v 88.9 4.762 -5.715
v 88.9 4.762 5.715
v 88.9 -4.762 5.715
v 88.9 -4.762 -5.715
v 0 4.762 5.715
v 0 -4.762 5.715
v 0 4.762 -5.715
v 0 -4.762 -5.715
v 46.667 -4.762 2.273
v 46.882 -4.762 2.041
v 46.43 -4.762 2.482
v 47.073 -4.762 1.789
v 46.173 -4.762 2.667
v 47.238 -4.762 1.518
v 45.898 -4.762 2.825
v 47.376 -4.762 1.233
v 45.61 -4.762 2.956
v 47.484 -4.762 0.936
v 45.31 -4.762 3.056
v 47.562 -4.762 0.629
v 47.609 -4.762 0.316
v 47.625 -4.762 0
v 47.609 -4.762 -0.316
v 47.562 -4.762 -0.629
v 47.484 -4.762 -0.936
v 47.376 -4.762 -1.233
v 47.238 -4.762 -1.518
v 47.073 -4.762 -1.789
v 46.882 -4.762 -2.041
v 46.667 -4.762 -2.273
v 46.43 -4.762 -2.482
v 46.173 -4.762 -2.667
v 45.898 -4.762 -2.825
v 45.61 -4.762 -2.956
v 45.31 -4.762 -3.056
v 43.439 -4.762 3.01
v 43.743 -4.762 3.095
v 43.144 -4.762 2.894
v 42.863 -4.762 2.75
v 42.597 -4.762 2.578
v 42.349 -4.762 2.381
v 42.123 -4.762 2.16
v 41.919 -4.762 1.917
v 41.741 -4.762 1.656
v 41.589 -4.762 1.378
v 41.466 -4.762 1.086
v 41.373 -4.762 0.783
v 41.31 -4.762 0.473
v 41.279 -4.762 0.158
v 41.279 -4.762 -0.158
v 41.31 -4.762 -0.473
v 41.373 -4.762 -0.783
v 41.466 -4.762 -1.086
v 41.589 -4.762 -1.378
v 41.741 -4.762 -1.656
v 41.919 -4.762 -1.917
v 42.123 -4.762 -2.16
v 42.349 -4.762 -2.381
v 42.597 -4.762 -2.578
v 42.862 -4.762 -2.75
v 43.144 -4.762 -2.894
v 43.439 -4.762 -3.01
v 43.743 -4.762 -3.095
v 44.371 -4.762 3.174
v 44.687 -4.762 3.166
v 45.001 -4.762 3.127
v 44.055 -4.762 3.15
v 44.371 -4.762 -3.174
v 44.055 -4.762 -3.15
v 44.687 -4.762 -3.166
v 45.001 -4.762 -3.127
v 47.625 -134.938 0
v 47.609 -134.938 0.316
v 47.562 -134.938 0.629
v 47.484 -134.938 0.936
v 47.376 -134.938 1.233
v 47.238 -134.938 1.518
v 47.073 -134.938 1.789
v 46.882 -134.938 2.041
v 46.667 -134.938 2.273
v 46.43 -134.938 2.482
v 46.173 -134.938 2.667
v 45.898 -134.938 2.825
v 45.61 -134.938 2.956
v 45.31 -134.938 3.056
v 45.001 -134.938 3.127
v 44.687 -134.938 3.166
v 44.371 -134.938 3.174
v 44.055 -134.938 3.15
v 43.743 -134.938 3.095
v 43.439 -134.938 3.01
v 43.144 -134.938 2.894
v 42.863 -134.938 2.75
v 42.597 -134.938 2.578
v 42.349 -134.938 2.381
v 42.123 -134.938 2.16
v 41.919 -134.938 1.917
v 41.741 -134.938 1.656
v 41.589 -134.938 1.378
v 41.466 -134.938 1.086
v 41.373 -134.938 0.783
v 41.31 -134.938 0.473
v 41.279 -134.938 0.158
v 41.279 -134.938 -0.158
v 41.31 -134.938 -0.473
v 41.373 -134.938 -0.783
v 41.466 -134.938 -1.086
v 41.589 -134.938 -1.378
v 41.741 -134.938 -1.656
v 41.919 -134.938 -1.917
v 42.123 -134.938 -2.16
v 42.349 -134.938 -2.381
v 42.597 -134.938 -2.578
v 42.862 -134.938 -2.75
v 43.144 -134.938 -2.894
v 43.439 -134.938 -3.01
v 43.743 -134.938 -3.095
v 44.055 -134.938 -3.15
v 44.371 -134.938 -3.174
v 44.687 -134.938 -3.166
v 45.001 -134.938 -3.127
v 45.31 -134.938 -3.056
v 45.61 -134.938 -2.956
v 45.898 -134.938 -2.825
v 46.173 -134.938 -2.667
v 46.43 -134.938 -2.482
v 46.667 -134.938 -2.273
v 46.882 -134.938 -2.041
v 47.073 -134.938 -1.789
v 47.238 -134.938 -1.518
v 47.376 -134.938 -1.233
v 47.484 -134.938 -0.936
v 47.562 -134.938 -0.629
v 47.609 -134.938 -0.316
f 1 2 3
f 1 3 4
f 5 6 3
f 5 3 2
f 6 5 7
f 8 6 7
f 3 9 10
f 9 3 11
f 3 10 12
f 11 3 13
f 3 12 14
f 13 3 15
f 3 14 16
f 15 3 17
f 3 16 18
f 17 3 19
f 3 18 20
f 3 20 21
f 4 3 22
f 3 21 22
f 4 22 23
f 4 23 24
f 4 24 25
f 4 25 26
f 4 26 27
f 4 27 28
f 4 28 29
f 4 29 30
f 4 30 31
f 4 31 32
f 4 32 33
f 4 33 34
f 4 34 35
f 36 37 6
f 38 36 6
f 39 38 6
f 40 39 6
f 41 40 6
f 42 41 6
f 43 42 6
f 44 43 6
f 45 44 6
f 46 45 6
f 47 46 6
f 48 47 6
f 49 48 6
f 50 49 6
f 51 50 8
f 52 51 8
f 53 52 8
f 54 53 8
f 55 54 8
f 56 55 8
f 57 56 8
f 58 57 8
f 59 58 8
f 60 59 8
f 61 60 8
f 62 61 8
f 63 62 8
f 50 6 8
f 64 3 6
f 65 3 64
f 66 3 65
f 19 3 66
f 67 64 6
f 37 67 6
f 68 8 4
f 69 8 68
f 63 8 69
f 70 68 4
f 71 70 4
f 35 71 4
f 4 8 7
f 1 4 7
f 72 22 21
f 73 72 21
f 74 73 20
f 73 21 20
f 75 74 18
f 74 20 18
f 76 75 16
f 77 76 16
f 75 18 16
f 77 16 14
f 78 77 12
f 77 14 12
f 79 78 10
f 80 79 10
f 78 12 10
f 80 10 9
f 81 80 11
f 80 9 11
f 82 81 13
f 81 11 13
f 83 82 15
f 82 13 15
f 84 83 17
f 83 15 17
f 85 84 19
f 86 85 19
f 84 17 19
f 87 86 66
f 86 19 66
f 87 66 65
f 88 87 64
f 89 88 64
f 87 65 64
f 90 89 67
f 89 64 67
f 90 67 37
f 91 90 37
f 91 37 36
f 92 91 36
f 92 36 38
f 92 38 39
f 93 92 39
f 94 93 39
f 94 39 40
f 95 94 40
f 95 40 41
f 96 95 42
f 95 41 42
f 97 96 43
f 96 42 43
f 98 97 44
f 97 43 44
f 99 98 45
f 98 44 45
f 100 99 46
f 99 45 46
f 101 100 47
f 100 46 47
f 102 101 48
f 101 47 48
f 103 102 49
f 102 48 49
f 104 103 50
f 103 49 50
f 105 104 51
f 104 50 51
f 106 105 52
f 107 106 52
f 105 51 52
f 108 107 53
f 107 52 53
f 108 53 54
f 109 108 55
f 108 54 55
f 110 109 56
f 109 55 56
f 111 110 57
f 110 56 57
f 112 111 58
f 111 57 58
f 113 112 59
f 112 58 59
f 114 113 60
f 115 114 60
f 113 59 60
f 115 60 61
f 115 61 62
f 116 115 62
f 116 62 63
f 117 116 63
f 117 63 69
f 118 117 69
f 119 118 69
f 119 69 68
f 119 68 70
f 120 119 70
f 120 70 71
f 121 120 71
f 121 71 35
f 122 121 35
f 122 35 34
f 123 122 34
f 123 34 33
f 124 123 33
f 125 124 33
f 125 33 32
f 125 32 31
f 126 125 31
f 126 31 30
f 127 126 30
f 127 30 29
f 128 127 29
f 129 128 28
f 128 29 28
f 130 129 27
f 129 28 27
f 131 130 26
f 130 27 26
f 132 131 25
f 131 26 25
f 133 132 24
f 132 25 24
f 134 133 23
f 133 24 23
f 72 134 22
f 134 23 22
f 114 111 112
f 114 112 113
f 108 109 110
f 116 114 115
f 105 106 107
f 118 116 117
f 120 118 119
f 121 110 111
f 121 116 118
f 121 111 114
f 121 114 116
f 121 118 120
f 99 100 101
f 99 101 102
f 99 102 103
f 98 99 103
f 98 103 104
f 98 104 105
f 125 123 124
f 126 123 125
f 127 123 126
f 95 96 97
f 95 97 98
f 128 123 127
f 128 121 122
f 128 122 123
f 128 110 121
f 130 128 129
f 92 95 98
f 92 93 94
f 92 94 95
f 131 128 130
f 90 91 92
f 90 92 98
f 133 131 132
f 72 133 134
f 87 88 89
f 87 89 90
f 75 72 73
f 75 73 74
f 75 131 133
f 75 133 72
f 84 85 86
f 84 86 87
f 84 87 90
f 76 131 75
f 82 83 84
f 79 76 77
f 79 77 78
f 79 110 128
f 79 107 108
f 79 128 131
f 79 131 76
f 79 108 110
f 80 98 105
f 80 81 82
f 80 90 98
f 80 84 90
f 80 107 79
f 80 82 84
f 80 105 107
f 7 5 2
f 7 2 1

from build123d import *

# Parameters (mm, degrees)
SKETCH1_W           = 11.43
SKETCH1_H           = 9.525
BOSS_EXTRUDE1_DEPTH = 88.9
SKETCH2_R           = 3.175
BOSS_EXTRUDE2_DEPTH = 130.175


with BuildPart() as part:
    # Sketch1 → Boss-Extrude1 (new body)
    with BuildSketch(Plane(origin=(0, 0, 0), x_dir=(0, 0, -1), z_dir=(1, 0, 0))):
        Rectangle(SKETCH1_W, SKETCH1_H)
    extrude(amount=BOSS_EXTRUDE1_DEPTH)

    # Sketch2 → Boss-Extrude2 (add)
    with BuildSketch(Plane.XZ.offset(4.7625)):
        with Locations((44.45, 0)):
            Circle(SKETCH2_R)
    extrude(amount=BOSS_EXTRUDE2_DEPTH)


solid = part.part
